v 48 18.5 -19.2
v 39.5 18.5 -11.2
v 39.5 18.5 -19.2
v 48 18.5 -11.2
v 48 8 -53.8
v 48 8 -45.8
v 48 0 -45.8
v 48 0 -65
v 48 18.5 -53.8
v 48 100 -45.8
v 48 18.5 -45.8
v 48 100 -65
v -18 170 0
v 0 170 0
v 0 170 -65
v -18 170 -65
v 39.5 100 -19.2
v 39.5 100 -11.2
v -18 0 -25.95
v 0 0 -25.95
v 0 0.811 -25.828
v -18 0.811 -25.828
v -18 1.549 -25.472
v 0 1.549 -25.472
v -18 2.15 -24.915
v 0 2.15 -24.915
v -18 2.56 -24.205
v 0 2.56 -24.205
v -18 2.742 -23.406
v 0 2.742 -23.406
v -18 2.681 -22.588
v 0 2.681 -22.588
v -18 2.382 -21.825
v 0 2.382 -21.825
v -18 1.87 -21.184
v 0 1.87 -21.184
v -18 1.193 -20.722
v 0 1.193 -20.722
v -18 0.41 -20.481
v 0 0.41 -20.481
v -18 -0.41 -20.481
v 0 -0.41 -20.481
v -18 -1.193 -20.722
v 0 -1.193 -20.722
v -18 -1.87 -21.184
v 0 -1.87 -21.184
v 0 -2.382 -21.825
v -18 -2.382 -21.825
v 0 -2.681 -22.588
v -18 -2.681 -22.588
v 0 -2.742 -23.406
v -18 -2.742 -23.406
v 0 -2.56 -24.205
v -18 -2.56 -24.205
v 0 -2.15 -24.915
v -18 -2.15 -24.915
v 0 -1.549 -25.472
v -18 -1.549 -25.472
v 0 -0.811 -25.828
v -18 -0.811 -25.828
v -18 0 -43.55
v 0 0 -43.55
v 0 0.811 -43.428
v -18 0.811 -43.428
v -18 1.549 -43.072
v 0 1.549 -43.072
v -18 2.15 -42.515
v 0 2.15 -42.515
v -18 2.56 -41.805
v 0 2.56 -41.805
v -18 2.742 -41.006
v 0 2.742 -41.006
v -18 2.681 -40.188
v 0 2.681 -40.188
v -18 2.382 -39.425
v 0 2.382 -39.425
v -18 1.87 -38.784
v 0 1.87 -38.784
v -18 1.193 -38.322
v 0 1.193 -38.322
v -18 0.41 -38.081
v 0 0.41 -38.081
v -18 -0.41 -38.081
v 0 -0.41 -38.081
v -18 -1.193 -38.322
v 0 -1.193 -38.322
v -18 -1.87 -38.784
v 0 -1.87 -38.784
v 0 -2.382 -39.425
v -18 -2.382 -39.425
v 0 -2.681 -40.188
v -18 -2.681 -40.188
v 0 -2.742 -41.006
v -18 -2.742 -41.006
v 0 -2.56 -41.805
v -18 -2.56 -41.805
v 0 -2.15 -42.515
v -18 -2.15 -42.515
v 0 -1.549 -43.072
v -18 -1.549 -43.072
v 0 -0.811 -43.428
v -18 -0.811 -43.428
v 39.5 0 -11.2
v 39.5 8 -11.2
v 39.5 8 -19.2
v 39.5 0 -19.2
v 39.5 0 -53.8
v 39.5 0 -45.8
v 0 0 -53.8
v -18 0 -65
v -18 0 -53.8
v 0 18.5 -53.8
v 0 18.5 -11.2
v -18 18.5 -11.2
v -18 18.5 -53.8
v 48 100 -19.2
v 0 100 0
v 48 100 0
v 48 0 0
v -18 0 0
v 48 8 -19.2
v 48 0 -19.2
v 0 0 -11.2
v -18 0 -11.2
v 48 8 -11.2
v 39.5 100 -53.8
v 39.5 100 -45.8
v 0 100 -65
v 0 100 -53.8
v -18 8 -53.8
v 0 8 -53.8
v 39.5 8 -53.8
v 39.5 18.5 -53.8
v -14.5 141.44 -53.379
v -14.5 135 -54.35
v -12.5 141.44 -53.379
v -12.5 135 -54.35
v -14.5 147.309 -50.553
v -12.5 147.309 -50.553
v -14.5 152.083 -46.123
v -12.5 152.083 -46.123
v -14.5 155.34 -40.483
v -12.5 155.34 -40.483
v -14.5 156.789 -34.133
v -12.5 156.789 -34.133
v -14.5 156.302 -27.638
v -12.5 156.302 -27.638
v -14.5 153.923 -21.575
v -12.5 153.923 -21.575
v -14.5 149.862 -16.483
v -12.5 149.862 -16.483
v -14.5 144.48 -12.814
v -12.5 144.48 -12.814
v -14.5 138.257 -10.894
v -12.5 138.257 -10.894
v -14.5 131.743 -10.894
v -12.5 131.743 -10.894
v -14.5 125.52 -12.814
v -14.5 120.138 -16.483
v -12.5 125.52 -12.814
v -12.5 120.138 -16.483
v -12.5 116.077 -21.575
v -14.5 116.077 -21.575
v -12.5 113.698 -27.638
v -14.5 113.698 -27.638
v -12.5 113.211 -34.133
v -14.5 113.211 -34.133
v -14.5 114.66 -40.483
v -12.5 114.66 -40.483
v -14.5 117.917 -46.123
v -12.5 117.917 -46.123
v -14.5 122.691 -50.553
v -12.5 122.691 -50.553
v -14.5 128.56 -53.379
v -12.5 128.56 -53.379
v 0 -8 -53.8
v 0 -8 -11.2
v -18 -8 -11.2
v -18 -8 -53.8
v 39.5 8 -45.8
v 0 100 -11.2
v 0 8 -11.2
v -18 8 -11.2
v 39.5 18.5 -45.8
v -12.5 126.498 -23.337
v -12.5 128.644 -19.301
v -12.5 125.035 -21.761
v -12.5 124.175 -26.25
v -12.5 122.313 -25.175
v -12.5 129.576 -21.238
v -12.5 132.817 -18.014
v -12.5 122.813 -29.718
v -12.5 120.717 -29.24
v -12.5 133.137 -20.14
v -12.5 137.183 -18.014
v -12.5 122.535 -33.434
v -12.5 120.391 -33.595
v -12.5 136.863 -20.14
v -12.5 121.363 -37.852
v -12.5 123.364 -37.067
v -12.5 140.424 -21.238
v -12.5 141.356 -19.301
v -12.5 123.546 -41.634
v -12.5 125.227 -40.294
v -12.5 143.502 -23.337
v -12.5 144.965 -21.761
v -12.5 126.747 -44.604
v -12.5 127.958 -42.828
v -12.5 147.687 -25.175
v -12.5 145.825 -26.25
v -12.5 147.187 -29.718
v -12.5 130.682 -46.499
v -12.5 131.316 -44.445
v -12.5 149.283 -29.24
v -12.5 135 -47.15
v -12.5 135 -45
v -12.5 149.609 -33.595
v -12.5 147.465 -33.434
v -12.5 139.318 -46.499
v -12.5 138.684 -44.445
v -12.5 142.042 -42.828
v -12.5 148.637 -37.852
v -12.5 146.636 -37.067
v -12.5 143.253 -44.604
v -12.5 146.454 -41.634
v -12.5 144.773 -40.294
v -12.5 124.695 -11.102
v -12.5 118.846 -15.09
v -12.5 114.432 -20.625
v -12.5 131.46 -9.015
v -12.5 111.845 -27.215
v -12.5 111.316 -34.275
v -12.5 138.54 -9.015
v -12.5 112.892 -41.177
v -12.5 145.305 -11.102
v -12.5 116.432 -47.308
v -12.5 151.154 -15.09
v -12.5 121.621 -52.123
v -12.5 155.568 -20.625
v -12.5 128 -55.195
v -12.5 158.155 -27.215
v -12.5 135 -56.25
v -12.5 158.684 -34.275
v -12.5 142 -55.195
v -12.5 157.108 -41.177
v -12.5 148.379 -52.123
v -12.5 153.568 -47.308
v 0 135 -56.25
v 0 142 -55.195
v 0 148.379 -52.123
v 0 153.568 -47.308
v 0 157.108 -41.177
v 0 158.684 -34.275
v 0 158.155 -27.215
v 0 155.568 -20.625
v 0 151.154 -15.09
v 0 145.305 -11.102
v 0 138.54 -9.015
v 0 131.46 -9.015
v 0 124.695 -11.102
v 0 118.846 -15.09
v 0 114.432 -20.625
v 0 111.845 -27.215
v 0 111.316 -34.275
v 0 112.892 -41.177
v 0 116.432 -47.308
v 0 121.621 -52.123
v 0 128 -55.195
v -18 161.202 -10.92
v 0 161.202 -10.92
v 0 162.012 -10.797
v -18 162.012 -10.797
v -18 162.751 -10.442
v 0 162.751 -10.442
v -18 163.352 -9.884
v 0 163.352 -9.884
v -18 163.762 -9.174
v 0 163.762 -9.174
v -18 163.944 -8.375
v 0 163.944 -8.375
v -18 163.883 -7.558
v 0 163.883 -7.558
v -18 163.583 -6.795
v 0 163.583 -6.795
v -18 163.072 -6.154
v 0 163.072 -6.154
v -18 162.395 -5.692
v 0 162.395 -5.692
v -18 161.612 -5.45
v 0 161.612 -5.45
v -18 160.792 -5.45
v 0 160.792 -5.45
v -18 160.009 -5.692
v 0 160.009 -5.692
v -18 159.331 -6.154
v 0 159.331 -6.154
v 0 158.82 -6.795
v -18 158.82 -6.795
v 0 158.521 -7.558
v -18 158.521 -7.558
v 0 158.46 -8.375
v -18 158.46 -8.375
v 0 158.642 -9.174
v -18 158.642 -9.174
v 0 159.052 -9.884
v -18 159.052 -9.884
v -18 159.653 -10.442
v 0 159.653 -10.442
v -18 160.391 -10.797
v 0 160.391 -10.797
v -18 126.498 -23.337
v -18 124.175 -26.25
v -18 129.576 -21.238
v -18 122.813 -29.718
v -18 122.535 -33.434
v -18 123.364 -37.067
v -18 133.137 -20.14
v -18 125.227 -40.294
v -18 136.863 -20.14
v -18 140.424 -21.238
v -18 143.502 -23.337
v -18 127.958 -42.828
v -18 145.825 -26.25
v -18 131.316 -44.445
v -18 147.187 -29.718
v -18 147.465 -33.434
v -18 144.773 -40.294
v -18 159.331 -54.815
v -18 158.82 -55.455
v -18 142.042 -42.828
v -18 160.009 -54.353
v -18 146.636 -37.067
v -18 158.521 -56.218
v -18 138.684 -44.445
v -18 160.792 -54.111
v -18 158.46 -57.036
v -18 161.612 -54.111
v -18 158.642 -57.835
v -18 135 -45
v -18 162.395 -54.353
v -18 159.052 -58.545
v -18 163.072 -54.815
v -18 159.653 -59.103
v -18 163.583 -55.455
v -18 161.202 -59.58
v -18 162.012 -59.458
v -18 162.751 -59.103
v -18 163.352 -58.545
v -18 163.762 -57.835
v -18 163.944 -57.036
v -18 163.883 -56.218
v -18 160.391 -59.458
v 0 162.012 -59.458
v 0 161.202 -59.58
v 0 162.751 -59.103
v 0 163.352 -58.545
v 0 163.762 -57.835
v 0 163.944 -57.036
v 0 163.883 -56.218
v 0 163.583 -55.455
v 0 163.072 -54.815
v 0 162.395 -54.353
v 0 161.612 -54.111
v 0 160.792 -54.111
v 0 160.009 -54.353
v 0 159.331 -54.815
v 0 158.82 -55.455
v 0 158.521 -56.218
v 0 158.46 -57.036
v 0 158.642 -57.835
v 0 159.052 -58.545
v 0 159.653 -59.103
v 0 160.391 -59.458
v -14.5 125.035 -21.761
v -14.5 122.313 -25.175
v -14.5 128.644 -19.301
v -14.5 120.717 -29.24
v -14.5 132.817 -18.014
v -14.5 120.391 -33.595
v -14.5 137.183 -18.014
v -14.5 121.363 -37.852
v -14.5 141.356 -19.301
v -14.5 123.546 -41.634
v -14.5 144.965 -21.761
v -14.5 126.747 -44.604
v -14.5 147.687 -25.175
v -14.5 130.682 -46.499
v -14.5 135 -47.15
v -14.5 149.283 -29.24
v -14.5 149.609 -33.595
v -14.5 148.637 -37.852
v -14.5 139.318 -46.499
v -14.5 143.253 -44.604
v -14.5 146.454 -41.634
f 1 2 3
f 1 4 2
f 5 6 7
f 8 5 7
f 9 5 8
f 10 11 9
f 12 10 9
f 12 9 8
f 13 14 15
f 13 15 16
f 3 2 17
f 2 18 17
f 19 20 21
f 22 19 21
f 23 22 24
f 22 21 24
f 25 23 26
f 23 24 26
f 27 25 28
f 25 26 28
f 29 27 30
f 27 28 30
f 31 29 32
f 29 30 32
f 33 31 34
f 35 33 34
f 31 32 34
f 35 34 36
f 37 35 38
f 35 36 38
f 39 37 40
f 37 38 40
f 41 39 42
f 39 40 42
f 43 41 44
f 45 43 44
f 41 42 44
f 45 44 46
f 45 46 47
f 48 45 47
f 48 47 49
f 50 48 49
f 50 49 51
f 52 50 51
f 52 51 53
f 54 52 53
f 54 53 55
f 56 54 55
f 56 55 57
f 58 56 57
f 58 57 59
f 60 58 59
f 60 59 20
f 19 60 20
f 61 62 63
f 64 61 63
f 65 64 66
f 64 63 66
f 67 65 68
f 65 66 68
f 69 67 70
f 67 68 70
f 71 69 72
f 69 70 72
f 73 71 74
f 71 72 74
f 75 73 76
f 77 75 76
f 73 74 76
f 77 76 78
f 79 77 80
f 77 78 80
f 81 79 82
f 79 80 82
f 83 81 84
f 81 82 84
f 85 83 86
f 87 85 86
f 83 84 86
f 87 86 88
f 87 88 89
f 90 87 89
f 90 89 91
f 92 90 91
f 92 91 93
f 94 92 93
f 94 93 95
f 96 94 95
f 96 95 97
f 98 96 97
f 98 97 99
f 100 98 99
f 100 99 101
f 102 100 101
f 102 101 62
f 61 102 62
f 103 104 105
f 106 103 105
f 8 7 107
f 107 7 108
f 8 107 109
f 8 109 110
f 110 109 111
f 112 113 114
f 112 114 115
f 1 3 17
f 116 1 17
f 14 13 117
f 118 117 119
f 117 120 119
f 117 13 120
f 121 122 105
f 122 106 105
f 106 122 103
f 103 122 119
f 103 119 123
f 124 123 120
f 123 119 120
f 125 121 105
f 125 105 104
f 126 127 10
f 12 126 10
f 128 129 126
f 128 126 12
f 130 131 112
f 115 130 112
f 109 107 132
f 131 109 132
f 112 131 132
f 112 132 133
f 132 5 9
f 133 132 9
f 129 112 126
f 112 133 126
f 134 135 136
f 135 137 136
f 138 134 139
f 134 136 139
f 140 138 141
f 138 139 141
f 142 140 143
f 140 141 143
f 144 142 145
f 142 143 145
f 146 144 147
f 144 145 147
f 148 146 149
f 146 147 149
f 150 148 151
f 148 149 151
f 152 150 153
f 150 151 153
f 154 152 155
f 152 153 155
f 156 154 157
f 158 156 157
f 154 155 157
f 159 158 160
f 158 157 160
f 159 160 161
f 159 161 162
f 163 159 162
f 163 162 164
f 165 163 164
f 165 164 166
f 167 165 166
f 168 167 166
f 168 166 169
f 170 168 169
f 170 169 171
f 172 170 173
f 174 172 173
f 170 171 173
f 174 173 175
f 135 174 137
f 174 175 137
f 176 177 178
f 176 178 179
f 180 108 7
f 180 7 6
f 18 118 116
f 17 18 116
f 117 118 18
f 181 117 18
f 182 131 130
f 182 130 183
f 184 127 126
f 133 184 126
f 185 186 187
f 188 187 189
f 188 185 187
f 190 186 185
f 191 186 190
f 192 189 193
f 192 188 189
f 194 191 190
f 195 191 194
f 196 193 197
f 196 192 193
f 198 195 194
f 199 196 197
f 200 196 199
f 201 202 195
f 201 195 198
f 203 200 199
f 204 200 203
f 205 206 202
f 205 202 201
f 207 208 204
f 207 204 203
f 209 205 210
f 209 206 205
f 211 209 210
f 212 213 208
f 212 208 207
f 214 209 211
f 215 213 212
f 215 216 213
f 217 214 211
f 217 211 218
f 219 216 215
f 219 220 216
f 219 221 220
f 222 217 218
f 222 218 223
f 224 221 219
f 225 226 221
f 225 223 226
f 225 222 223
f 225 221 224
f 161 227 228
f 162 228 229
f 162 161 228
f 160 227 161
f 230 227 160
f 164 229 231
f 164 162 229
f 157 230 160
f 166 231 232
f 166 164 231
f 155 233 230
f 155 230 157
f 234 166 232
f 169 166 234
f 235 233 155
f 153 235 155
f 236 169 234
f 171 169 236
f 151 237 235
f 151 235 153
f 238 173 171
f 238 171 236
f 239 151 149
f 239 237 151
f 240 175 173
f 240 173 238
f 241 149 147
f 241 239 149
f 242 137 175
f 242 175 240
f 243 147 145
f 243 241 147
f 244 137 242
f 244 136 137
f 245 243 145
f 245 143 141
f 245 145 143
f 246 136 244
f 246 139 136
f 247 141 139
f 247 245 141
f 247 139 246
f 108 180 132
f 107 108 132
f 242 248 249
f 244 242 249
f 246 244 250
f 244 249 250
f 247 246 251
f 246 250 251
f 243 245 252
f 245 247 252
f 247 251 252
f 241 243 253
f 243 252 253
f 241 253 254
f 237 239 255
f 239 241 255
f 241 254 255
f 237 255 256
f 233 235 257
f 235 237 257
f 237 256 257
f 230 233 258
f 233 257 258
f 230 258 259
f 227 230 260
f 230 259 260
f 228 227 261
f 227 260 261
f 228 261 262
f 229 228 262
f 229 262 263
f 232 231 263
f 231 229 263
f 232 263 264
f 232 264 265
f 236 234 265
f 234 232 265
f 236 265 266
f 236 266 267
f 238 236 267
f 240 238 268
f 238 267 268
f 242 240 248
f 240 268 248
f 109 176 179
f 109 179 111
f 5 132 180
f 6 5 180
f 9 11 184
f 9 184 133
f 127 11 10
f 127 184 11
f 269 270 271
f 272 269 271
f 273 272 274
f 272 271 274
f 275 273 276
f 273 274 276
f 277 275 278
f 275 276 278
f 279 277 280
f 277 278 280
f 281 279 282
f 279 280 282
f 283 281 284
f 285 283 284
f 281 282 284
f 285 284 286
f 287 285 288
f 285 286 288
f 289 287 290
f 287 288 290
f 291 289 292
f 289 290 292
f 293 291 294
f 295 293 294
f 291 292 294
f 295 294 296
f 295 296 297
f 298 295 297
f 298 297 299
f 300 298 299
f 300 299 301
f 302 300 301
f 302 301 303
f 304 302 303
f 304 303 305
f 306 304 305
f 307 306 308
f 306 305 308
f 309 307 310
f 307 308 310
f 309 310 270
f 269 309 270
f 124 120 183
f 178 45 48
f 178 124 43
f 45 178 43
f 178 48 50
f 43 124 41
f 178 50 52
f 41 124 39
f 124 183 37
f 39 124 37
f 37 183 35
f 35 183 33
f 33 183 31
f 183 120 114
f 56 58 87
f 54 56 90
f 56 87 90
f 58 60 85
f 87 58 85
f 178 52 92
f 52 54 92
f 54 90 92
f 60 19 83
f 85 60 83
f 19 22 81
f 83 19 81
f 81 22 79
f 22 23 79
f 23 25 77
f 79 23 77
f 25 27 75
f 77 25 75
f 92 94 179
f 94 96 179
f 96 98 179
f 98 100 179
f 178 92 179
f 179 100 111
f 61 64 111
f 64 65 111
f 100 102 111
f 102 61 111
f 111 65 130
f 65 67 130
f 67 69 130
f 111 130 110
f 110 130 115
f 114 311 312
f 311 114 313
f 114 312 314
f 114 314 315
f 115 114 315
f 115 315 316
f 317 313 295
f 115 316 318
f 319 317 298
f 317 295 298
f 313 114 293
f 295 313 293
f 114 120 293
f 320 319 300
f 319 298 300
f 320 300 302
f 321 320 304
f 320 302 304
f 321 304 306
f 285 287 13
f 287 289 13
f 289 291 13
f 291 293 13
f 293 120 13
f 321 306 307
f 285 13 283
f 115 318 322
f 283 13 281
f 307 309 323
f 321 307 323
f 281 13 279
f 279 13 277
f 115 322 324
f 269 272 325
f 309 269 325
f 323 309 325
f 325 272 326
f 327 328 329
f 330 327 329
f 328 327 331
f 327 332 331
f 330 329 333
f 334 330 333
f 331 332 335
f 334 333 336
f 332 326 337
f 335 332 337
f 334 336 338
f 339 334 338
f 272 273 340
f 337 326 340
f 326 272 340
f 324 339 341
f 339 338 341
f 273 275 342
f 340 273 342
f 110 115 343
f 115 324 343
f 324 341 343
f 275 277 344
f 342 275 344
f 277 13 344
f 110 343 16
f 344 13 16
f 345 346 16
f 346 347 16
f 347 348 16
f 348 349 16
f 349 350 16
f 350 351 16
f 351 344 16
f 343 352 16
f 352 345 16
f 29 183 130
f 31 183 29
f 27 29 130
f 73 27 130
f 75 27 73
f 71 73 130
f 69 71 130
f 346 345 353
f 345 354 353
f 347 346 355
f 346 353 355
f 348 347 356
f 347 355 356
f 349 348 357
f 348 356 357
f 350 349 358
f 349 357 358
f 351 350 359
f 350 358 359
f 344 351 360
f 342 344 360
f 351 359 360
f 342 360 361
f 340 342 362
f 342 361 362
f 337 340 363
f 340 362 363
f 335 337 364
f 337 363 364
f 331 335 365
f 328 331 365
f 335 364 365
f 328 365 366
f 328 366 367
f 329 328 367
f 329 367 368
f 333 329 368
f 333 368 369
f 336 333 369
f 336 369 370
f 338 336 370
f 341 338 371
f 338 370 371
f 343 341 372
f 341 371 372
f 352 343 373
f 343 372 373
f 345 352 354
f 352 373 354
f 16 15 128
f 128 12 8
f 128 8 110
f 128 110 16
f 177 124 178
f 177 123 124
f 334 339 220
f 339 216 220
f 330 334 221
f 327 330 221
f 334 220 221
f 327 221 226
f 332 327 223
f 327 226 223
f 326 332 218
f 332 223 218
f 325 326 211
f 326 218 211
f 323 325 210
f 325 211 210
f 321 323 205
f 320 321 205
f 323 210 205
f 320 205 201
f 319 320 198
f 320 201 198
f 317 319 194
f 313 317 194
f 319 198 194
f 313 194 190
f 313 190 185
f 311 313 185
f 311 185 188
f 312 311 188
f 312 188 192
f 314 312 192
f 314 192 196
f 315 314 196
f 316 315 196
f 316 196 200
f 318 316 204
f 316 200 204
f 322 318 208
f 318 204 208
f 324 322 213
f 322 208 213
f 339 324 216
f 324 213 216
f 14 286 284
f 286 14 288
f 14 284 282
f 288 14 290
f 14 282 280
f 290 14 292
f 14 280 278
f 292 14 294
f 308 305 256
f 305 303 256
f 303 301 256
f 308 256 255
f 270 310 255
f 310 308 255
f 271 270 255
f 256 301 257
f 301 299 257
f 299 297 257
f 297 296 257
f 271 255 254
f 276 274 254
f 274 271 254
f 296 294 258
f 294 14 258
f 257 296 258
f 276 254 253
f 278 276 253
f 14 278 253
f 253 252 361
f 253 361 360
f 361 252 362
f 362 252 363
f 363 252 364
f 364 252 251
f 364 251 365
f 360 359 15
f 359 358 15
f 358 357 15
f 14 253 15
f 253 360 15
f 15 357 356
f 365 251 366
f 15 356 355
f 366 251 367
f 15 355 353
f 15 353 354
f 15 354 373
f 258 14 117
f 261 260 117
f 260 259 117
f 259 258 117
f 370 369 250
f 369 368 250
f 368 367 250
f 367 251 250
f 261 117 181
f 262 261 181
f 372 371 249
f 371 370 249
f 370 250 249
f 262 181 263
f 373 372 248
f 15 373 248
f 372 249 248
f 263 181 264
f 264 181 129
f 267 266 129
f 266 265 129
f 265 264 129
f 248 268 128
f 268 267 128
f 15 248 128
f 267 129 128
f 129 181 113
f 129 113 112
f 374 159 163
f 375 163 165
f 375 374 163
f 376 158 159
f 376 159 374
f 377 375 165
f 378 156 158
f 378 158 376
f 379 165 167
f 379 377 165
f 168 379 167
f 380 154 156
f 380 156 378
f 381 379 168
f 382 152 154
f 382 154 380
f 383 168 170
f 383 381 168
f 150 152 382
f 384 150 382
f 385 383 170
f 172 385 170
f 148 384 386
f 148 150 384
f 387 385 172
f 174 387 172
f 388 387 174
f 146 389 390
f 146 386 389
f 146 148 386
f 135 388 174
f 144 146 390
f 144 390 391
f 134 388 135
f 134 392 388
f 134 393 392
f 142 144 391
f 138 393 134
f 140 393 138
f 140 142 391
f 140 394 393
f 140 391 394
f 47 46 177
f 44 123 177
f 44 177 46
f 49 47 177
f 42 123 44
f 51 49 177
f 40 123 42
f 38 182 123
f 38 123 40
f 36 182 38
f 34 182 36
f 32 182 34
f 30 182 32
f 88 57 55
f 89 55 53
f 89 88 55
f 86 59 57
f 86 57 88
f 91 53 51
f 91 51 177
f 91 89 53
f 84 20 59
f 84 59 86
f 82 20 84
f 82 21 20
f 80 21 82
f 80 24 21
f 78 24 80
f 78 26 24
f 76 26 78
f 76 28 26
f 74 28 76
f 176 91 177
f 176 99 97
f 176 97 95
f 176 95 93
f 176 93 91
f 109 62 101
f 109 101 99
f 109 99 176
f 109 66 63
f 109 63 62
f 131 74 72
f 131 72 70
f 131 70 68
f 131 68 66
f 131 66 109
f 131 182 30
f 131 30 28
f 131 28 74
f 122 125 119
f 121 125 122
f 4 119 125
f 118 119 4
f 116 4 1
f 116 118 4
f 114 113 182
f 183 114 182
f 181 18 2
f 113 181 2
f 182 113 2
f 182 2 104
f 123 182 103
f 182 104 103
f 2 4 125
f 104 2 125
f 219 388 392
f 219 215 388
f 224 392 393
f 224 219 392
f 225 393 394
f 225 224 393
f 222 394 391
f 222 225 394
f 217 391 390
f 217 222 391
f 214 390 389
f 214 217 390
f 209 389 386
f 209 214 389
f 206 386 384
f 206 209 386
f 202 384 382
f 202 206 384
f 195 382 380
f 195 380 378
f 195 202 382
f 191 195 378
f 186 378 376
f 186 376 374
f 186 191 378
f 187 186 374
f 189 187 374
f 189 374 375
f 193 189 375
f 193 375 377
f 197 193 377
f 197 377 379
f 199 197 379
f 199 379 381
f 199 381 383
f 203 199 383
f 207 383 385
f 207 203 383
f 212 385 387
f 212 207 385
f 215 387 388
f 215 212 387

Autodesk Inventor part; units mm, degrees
ref_plane "YZ Plane" through (0, 0, 0) normal (1, 0, 0) x (0, 1, 0)
ref_plane "XZ Plane" through (0, 0, 0) normal (0, 1, 0) x (-1, 0, 0)
ref_plane "XY Plane" through (0, 0, 0) normal (0, 0, 1) x (1, 0, 0)
sketch "Sketch3" plane through (0, 0, 0) normal (0, 1, 0) x (-1, 0, 0)
  line L0 (0, 0) -> (0, -65)
  line L1 (0, -65) -> (25, -65)
  line L2 (25, -65) -> (25, 0)
  line L3 (25, 0) -> (0, 0)
  dimension "d8" = 65
  dimension "d9" = 25
  dimension "d10" = 65
extrude "Extrusion2" add sketch "Sketch3" along normal blind 170
sketch "Sketch4" plane through (0, 0, 0) normal (1, 0, 0) x (0, 0, -1)
  line L0 (65, 170) -> (0, 170) projected
  line L1 (0, 170) -> (32.5, 170)
  line L2 (65, 0) -> (65, 170) projected
  line L3 (32.5, 170) -> (32.5, 135)
  circle A0 centre (32.5, 135) radius 23.75
  point P0 (0, 0)
  dimension "d13" = 32.5
  dimension "d15" = 35
  dimension "d16" = 47.5
extrude "Extrusion3" cut sketch "Sketch4" against normal blind 12.5
sketch "Sketch6" plane through (0, 0, 0) normal (1, 0, 0) x (0, 0, -1)
  line L0 (65, 0) -> (0, 0) projected
  line L1 (0, 0) -> (32.5, 0)
  line L2 (32.5, 0) -> (11.2, 0)
  line L3 (11.2, 0) -> (53.8, 0)
  line L4 (53.8, 0) -> (53.8, 100)
  line L5 (53.8, 100) -> (65, 100)
  line L6 (65, 0) -> (65, 170) projected
  line L7 (65, 0) -> (53.8, 0)
  line L8 (11.2, 0) -> (0, 0)
  line L9 (0, 0) -> (0, 170) projected
  line L10 (0, 100) -> (11.2, 100)
  line L11 (11.2, 100) -> (11.2, 0)
  dimension "d23" = 21.3
  dimension "d24" = 42.6
  dimension "d25" = 100
extrude "Extrusion4" add sketch "Sketch6" along normal blind 39.5
sketch "Sketch7" plane through (39.5, 0, 0) normal (1, 0, 0) x (0, 0, -1)
  line L0 (65, 0) -> (0, 0) projected
  line L1 (53.8, 0) -> (53.8, 100) projected
  line L2 (65, 0) -> (53.8, 0)
  line L3 (53.8, 0) -> (45.8, 0)
  line L4 (45.8, 0) -> (45.8, 100)
  line L5 (53.8, 100) -> (65, 100) projected
  line L6 (45.8, 100) -> (65, 100)
  line L7 (65, 0) -> (65, 170) projected
  line L8 (65, 100) -> (65, 0)
  line L9 (11.2, 100) -> (11.2, 0) projected
  line L10 (11.2, 0) -> (19.2, 0)
  line L11 (19.2, 0) -> (19.2, 100)
  line L12 (0, 100) -> (11.2, 100) projected
  line L13 (19.2, 100) -> (0, 100)
  line L14 (0, 100) -> (0, 0)
  dimension "d28" = 8
  dimension "d29" = 8
extrude "Extrusion5" add sketch "Sketch7" along normal blind 8.5
sketch "Sketch8" plane through (48, 0, 0) normal (1, 0, 0) x (0, 0, -1)
  circle A0 centre (32.5, 135) radius 23.75 projected
  circle A1 centre (32.5, 135) radius 76.5
  line L0 (65, 0) -> (0, 0) projected
  line L1 (32.5, 0) -> (32.5, 58.5)
  line L2 (32.5, 58.5) -> (32.5, 57.9046)
  line L3 (32.5, 58.5) -> (32.5, 40.5)
  circle A2 centre (32.5, 49.5) radius 9
  line L4 (32.5, 49.5) -> (32.5, 28.5)
  line L5 (32.5, 28.5) -> (53.5, 28.5)
  line L6 (53.8, 0) -> (53.8, 100) projected
  line L7 (53.5, 28.5) -> (53.5, 70.5)
  line L8 (53.5, 70.5) -> (11.5, 70.5)
  line L9 (11.2, 100) -> (11.2, 0) projected
  line L10 (11.5, 70.5) -> (11.5, 28.5)
  line L11 (11.5, 28.5) -> (32.5, 28.5)
  line L12 (32.5, 28.5) -> (32.5, 16.4931)
  line L13 (32.5, 28.5) -> (32.5, 18.5)
  line L14 (32.5, 18.5) -> (55.5, 18.5)
  line L15 (55.5, 18.5) -> (55.5, 8)
  line L16 (55.5, 8) -> (9.5, 8)
  line L17 (9.5, 8) -> (9.5, 18.5)
  line L18 (9.5, 18.5) -> (32.5, 18.5)
  point P0 (11.2, 18.5)
  point P1 (11.2, 8)
  point P2 (53.8, 8)
  point P3 (53.8, 18.5)
  dimension "d32" = 153
  dimension "d33" = 18
  dimension "d34" = 21
  dimension "d38" = 42
  dimension "d39" = 42
  dimension "d42" = 42
  dimension "d43" = 10
  dimension "d44" = 23
  dimension "d45" = 10.5
  dimension "d46" = 46
  dimension "d47" = 10.5
extrude "Extrusion6" cut sketch "Sketch8" against normal through all contours L18 L1 L16 L9 | L6 L16 L1 L14
sketch "Sketch9" plane through (-12.5, 135, -32.5) normal (1, 0, 0) x (0, 0, -1)
  circle A0 centre (0, 0) radius 12.5
  point P0 (-32.5, -135)
  dimension "d50" = 25
extrude "Extrusion7" cut sketch "Sketch9" against normal through all
sketch "Sketch10" plane through (-25, 0, -65) normal (-1, 0, 0) x (0, 0, 1)
  line L0 (65, 0) -> (45.8, 0) projected
  line L1 (65, 0) -> (0, 0)
  line L2 (0, 0) -> (0, 170)
  line L3 (0, 170) -> (65, 170)
  line L4 (65, 170) -> (65, 0)
extrude "Extrusion8" cut sketch "Sketch10" against normal blind 7
sketch "Sketch11" plane through (48, 0, 0) normal (1, 0, 0) x (0, 0, -1)
  circle A0 centre (32.5, 135) radius 12.5 projected
  line L0 (32.5, 135) -> (32.5, 18.5)
  line L1 (11.2, 18.5) -> (53.8, 18.5) projected
  point P0 (0, 0)
sketch "Sketch12" plane through (-12.5, 135, -32.5) normal (1, 0, 0) x (0, 0, -1)
  circle A0 centre (0, 0) radius 12.5 projected
  circle A1 centre (0, 0) radius 14.65
  circle A2 centre (0, 0) radius 21.85
  point P0 (-32.5, -135)
  dimension "d55" = 29.3
  dimension "d56" = 43.7
extrude "Extrusion9" cut sketch "Sketch12" against normal blind 2 contours A2
sketch "Sketch13" plane through (0, 170, 0) normal (1, 0, 0) x (0, 0, -1)
  line L0 (65, -170) -> (65, 0) projected
  circle A0 centre (32.5, -35) radius 21.85 projected
  line L1 (0, 0) -> (0, -170) projected
  circle A1 centre (32.5, -35) radius 14.65 projected
  circle A2 centre (32.5, -35) radius 23.75
  line L2 (65, 0) -> (48.6607, -17.5962)
  line L3 (16.3393, -17.5962) -> (0, 0)
  circle A3 centre (56.8304, -8.7981) radius 2.75
  circle A4 centre (8.1696, -8.7981) radius 2.75
  dimension "d59" = 5.5
  dimension "d60" = 5.5
extrude "Extrusion10" cut sketch "Sketch13" against normal through all contours A4 L3 | L3 A4 | A3 L2 | L2 A3
sketch "Sketch14" plane through (0, 0, -11.2) normal (1, 0, 0) x (0, 0, -1)
  line L0 (0, 0) -> (42.6, 0) projected
  point P0 (-11.2, 0)
sketch "Sketch15" plane through (0, 0, -11.2) normal (1, 0, 0) x (0, 0, -1)
  line L0 (0, 0) -> (0, 8) projected
  line L1 (0, 0) -> (0, -8)
  line L2 (0, -8) -> (42.6, -8)
  line L3 (34.6, 0) -> (42.6, 0) projected
  line L4 (42.6, -8) -> (42.6, 0)
  line L5 (42.6, 0) -> (0, 0)
  point P0 (-11.2, 0)
  dimension "d63" = 8
extrude "Extrusion11" add sketch "Sketch15" against normal blind 18
sketch "Sketch16" plane through (0, 8, -11.2) normal (1, 0, 0) x (0, 0, -1)
  line L0 (0, -8) -> (8, -8) projected
  line L1 (8, -8) -> (12, -8)
  line L2 (42.6, -16) -> (0, -16) projected
  line L3 (34.6, 0) -> (34.6, -8) projected
  line L4 (12, -8) -> (34.6, -8)
  line L5 (34.6, -8) -> (29.6, -8)
  circle A0 centre (29.6, -8) radius 2.75
  circle A1 centre (12, -8) radius 2.75
  point P0 (-11.2, -8)
  dimension "d66" = 4
  dimension "d67" = 5
  dimension "d68" = 5.5
  dimension "d69" = 5.5
extrude "Extrusion12" cut sketch "Sketch16" against normal through all
sketch "Sketch17" plane through (0, 170, 0) normal (1, 0, 0) x (0, 0, -1)
  point P0 (0, -170)
sketch "Sketch18" plane through (-18, 0, -65) normal (-1, 0, 0) x (0, 0, 1)
  point P0 (65, 0)
sketch "Sketch19" plane through (-18, 0, -65) normal (-1, 0, 0) x (0, 0, 1)
  point P0 (65, 0)
properties part number "base"
